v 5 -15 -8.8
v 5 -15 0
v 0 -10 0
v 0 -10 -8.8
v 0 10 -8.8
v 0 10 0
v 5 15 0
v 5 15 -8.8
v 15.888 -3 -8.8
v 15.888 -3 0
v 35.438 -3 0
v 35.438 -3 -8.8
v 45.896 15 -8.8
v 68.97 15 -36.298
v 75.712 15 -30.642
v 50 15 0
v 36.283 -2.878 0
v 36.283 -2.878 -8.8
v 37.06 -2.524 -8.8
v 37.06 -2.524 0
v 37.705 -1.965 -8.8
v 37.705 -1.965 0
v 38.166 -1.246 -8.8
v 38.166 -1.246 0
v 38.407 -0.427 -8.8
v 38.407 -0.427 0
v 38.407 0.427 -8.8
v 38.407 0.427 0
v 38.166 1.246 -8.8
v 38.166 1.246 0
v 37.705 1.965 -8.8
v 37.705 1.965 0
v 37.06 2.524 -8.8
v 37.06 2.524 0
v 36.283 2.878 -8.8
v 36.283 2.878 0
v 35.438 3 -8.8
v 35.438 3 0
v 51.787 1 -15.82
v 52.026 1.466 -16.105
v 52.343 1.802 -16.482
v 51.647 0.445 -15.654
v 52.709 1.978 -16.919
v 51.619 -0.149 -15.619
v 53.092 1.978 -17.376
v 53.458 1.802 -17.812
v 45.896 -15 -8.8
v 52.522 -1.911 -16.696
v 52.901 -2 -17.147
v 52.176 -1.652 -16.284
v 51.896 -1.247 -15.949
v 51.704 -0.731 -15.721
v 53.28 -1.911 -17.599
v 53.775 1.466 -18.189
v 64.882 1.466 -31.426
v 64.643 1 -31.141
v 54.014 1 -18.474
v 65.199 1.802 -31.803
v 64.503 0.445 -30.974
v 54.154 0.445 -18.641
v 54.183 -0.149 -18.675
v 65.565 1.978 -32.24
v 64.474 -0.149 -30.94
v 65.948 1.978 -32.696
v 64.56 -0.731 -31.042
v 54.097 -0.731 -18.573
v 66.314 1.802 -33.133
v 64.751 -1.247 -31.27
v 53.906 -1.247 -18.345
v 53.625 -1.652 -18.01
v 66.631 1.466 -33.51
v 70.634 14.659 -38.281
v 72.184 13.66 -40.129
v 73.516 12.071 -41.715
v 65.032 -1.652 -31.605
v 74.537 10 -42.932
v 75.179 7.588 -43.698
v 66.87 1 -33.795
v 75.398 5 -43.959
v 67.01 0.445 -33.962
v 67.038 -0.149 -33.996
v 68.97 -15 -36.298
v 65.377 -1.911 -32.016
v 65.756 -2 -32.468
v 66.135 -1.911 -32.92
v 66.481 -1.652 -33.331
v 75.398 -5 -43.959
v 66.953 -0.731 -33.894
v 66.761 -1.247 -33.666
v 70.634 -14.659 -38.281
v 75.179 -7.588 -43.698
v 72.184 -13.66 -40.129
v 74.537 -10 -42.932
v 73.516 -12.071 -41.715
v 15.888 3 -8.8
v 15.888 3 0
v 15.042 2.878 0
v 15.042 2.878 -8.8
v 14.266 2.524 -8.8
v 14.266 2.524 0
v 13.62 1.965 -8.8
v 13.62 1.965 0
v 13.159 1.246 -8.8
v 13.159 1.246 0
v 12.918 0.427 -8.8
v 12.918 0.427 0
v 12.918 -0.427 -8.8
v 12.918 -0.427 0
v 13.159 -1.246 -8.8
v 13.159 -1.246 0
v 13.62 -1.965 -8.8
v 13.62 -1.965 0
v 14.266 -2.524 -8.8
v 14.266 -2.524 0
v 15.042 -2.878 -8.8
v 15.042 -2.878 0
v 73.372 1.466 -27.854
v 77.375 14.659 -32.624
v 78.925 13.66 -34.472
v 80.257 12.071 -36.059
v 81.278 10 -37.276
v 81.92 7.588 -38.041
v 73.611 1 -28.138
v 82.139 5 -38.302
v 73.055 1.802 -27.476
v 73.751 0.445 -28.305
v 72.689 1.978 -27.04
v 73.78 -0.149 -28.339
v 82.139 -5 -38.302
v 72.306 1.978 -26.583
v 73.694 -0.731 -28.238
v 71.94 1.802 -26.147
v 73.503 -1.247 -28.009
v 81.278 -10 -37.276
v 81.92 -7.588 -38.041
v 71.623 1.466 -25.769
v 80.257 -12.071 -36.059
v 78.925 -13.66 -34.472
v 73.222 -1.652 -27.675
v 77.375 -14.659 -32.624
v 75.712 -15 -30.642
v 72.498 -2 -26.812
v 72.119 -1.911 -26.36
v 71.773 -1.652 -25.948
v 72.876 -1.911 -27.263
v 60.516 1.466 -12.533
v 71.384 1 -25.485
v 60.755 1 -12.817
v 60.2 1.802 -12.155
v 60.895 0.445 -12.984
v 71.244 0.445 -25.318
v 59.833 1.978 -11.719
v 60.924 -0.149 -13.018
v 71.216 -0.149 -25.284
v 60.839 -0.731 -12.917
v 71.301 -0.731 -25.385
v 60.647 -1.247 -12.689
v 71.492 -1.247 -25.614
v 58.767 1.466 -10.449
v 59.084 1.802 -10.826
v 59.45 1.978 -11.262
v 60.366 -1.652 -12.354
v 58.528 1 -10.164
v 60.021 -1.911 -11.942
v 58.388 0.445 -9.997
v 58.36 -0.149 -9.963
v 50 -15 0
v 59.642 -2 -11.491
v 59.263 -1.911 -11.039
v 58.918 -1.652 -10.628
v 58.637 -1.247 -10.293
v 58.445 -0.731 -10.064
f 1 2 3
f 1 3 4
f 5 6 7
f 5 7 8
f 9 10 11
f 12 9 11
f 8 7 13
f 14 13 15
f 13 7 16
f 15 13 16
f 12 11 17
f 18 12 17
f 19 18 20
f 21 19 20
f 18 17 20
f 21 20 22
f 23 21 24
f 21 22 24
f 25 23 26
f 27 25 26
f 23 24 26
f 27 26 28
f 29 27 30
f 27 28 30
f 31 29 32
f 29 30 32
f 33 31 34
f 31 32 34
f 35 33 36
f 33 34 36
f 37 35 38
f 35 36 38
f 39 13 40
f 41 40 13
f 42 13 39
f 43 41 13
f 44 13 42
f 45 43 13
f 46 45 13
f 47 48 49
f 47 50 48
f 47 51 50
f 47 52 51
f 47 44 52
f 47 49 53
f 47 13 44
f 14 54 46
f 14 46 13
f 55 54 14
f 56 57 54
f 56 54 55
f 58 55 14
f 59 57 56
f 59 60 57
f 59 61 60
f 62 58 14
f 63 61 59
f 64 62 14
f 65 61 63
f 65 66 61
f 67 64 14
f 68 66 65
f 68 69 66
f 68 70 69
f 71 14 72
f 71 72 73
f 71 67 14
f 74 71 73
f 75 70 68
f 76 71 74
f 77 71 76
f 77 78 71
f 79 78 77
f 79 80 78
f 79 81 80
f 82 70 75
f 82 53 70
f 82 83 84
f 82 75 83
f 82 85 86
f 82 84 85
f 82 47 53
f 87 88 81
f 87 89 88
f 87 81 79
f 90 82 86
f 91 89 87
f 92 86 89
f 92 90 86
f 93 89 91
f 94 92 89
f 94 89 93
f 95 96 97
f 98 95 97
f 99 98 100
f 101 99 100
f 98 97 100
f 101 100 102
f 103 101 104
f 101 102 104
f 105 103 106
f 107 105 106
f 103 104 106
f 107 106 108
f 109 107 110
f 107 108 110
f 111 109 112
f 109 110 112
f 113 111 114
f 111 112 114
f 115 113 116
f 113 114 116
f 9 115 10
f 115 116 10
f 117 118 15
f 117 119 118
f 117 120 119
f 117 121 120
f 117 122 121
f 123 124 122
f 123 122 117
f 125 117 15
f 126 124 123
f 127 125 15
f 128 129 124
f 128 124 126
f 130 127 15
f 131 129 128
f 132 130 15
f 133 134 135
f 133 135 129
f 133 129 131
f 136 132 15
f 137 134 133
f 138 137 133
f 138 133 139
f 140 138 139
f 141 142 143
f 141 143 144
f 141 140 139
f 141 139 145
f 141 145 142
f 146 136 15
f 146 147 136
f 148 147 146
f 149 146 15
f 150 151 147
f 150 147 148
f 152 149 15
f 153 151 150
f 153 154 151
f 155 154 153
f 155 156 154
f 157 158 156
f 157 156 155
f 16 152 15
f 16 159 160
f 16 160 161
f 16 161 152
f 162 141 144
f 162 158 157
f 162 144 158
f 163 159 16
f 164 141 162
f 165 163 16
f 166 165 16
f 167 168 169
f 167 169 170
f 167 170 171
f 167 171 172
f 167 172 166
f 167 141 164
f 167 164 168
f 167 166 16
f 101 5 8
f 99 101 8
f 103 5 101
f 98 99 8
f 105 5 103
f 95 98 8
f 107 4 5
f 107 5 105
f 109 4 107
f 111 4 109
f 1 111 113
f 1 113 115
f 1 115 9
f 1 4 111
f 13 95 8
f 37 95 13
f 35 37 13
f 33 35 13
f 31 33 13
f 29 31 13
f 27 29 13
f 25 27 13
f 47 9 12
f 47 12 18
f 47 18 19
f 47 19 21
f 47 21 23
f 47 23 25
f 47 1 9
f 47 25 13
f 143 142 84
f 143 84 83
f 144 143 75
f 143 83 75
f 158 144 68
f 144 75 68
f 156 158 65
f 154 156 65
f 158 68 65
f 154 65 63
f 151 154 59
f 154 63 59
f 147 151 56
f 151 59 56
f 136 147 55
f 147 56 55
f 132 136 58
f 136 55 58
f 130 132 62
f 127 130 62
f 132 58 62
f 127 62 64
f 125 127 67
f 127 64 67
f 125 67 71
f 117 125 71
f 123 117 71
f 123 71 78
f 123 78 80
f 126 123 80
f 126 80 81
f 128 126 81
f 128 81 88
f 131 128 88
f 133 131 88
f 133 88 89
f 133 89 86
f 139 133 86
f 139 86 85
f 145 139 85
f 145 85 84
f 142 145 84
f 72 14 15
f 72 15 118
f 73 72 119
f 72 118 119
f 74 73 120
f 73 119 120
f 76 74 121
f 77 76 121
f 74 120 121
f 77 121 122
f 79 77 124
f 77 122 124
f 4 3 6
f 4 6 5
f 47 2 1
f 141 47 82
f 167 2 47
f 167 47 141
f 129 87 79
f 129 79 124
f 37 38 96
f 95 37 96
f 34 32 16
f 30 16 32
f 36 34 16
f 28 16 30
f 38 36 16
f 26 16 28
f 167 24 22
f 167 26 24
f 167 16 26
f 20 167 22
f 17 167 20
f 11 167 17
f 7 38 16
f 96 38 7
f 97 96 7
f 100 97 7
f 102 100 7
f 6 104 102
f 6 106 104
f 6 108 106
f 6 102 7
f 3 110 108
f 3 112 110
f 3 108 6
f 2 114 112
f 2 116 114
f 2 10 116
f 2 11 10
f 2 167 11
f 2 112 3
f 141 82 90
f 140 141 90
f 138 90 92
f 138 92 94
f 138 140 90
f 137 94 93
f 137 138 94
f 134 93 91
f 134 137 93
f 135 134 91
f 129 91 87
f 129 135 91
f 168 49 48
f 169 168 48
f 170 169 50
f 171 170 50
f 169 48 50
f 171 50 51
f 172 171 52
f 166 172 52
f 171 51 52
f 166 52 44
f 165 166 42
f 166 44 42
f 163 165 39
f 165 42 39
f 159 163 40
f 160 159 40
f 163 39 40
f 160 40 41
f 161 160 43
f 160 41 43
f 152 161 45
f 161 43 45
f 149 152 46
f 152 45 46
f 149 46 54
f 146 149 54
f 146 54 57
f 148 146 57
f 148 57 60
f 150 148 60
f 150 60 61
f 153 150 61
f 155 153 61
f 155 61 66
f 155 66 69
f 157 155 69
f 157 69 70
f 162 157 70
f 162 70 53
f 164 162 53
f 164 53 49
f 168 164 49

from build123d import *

# Parameters (mm, degrees)
F1_DEPTH = 15
F3_DEPTH = 43.9597531212
F5_D     = 4
F6_R     = 10
F7_SIZE  = 5


with BuildPart() as f1:
    # F0 (on Front) → F1 (new body, symmetric)
    with BuildSketch(Plane.XZ):
        Polygon((50, 0), (0, 0), (0, -8.8), (45.8964926082, -8.8), (75.3981893849, -43.9587531212), (82.1393804843, -38.3022221559), align=None)
    extrude(amount=F1_DEPTH, both=True)

    # F2 (on face) → F3 (cut, through all)
    with BuildSketch(Plane.XY):
        with BuildLine():
            ThreePointArc((15.8875472844, 3), (12.8875472844, 0), (15.8875472844, -3))
            Line((15.8875472844, -3), (35.4375839233, -3))
            ThreePointArc((35.4375839233, -3), (38.4375839233, 0), (35.4375839233, 3))
            Line((35.4375839233, 3), (15.8875472844, 3))
        make_face()
    extrude(amount=-F3_DEPTH, mode=Mode.SUBTRACT)

    # F5 (through all)
    with Locations(Plane(origin=(29.3412044417, 0, 24.6201938253), x_dir=(0, 1, 0), z_dir=(0.7660444431, 0, 0.6427876097))):
        with Locations((0, -47.1393804843), (0, -67.1393804843)):
            Hole(F5_D / 2)

    # F6
    f6_edges = [f1.edges().sort_by_distance(p)[0] for p in [
        (78.768785, -15, -41.130488),
        (78.768785, 15, -41.130488),
    ]]
    fillet(f6_edges, radius=F6_R)

    # F7
    f7_edges = [f1.edges().sort_by_distance(p)[0] for p in [
        (0, -15, -4.4),
        (0, 15, -4.4),
    ]]
    chamfer(f7_edges, length=F7_SIZE)


solid = f1.part
